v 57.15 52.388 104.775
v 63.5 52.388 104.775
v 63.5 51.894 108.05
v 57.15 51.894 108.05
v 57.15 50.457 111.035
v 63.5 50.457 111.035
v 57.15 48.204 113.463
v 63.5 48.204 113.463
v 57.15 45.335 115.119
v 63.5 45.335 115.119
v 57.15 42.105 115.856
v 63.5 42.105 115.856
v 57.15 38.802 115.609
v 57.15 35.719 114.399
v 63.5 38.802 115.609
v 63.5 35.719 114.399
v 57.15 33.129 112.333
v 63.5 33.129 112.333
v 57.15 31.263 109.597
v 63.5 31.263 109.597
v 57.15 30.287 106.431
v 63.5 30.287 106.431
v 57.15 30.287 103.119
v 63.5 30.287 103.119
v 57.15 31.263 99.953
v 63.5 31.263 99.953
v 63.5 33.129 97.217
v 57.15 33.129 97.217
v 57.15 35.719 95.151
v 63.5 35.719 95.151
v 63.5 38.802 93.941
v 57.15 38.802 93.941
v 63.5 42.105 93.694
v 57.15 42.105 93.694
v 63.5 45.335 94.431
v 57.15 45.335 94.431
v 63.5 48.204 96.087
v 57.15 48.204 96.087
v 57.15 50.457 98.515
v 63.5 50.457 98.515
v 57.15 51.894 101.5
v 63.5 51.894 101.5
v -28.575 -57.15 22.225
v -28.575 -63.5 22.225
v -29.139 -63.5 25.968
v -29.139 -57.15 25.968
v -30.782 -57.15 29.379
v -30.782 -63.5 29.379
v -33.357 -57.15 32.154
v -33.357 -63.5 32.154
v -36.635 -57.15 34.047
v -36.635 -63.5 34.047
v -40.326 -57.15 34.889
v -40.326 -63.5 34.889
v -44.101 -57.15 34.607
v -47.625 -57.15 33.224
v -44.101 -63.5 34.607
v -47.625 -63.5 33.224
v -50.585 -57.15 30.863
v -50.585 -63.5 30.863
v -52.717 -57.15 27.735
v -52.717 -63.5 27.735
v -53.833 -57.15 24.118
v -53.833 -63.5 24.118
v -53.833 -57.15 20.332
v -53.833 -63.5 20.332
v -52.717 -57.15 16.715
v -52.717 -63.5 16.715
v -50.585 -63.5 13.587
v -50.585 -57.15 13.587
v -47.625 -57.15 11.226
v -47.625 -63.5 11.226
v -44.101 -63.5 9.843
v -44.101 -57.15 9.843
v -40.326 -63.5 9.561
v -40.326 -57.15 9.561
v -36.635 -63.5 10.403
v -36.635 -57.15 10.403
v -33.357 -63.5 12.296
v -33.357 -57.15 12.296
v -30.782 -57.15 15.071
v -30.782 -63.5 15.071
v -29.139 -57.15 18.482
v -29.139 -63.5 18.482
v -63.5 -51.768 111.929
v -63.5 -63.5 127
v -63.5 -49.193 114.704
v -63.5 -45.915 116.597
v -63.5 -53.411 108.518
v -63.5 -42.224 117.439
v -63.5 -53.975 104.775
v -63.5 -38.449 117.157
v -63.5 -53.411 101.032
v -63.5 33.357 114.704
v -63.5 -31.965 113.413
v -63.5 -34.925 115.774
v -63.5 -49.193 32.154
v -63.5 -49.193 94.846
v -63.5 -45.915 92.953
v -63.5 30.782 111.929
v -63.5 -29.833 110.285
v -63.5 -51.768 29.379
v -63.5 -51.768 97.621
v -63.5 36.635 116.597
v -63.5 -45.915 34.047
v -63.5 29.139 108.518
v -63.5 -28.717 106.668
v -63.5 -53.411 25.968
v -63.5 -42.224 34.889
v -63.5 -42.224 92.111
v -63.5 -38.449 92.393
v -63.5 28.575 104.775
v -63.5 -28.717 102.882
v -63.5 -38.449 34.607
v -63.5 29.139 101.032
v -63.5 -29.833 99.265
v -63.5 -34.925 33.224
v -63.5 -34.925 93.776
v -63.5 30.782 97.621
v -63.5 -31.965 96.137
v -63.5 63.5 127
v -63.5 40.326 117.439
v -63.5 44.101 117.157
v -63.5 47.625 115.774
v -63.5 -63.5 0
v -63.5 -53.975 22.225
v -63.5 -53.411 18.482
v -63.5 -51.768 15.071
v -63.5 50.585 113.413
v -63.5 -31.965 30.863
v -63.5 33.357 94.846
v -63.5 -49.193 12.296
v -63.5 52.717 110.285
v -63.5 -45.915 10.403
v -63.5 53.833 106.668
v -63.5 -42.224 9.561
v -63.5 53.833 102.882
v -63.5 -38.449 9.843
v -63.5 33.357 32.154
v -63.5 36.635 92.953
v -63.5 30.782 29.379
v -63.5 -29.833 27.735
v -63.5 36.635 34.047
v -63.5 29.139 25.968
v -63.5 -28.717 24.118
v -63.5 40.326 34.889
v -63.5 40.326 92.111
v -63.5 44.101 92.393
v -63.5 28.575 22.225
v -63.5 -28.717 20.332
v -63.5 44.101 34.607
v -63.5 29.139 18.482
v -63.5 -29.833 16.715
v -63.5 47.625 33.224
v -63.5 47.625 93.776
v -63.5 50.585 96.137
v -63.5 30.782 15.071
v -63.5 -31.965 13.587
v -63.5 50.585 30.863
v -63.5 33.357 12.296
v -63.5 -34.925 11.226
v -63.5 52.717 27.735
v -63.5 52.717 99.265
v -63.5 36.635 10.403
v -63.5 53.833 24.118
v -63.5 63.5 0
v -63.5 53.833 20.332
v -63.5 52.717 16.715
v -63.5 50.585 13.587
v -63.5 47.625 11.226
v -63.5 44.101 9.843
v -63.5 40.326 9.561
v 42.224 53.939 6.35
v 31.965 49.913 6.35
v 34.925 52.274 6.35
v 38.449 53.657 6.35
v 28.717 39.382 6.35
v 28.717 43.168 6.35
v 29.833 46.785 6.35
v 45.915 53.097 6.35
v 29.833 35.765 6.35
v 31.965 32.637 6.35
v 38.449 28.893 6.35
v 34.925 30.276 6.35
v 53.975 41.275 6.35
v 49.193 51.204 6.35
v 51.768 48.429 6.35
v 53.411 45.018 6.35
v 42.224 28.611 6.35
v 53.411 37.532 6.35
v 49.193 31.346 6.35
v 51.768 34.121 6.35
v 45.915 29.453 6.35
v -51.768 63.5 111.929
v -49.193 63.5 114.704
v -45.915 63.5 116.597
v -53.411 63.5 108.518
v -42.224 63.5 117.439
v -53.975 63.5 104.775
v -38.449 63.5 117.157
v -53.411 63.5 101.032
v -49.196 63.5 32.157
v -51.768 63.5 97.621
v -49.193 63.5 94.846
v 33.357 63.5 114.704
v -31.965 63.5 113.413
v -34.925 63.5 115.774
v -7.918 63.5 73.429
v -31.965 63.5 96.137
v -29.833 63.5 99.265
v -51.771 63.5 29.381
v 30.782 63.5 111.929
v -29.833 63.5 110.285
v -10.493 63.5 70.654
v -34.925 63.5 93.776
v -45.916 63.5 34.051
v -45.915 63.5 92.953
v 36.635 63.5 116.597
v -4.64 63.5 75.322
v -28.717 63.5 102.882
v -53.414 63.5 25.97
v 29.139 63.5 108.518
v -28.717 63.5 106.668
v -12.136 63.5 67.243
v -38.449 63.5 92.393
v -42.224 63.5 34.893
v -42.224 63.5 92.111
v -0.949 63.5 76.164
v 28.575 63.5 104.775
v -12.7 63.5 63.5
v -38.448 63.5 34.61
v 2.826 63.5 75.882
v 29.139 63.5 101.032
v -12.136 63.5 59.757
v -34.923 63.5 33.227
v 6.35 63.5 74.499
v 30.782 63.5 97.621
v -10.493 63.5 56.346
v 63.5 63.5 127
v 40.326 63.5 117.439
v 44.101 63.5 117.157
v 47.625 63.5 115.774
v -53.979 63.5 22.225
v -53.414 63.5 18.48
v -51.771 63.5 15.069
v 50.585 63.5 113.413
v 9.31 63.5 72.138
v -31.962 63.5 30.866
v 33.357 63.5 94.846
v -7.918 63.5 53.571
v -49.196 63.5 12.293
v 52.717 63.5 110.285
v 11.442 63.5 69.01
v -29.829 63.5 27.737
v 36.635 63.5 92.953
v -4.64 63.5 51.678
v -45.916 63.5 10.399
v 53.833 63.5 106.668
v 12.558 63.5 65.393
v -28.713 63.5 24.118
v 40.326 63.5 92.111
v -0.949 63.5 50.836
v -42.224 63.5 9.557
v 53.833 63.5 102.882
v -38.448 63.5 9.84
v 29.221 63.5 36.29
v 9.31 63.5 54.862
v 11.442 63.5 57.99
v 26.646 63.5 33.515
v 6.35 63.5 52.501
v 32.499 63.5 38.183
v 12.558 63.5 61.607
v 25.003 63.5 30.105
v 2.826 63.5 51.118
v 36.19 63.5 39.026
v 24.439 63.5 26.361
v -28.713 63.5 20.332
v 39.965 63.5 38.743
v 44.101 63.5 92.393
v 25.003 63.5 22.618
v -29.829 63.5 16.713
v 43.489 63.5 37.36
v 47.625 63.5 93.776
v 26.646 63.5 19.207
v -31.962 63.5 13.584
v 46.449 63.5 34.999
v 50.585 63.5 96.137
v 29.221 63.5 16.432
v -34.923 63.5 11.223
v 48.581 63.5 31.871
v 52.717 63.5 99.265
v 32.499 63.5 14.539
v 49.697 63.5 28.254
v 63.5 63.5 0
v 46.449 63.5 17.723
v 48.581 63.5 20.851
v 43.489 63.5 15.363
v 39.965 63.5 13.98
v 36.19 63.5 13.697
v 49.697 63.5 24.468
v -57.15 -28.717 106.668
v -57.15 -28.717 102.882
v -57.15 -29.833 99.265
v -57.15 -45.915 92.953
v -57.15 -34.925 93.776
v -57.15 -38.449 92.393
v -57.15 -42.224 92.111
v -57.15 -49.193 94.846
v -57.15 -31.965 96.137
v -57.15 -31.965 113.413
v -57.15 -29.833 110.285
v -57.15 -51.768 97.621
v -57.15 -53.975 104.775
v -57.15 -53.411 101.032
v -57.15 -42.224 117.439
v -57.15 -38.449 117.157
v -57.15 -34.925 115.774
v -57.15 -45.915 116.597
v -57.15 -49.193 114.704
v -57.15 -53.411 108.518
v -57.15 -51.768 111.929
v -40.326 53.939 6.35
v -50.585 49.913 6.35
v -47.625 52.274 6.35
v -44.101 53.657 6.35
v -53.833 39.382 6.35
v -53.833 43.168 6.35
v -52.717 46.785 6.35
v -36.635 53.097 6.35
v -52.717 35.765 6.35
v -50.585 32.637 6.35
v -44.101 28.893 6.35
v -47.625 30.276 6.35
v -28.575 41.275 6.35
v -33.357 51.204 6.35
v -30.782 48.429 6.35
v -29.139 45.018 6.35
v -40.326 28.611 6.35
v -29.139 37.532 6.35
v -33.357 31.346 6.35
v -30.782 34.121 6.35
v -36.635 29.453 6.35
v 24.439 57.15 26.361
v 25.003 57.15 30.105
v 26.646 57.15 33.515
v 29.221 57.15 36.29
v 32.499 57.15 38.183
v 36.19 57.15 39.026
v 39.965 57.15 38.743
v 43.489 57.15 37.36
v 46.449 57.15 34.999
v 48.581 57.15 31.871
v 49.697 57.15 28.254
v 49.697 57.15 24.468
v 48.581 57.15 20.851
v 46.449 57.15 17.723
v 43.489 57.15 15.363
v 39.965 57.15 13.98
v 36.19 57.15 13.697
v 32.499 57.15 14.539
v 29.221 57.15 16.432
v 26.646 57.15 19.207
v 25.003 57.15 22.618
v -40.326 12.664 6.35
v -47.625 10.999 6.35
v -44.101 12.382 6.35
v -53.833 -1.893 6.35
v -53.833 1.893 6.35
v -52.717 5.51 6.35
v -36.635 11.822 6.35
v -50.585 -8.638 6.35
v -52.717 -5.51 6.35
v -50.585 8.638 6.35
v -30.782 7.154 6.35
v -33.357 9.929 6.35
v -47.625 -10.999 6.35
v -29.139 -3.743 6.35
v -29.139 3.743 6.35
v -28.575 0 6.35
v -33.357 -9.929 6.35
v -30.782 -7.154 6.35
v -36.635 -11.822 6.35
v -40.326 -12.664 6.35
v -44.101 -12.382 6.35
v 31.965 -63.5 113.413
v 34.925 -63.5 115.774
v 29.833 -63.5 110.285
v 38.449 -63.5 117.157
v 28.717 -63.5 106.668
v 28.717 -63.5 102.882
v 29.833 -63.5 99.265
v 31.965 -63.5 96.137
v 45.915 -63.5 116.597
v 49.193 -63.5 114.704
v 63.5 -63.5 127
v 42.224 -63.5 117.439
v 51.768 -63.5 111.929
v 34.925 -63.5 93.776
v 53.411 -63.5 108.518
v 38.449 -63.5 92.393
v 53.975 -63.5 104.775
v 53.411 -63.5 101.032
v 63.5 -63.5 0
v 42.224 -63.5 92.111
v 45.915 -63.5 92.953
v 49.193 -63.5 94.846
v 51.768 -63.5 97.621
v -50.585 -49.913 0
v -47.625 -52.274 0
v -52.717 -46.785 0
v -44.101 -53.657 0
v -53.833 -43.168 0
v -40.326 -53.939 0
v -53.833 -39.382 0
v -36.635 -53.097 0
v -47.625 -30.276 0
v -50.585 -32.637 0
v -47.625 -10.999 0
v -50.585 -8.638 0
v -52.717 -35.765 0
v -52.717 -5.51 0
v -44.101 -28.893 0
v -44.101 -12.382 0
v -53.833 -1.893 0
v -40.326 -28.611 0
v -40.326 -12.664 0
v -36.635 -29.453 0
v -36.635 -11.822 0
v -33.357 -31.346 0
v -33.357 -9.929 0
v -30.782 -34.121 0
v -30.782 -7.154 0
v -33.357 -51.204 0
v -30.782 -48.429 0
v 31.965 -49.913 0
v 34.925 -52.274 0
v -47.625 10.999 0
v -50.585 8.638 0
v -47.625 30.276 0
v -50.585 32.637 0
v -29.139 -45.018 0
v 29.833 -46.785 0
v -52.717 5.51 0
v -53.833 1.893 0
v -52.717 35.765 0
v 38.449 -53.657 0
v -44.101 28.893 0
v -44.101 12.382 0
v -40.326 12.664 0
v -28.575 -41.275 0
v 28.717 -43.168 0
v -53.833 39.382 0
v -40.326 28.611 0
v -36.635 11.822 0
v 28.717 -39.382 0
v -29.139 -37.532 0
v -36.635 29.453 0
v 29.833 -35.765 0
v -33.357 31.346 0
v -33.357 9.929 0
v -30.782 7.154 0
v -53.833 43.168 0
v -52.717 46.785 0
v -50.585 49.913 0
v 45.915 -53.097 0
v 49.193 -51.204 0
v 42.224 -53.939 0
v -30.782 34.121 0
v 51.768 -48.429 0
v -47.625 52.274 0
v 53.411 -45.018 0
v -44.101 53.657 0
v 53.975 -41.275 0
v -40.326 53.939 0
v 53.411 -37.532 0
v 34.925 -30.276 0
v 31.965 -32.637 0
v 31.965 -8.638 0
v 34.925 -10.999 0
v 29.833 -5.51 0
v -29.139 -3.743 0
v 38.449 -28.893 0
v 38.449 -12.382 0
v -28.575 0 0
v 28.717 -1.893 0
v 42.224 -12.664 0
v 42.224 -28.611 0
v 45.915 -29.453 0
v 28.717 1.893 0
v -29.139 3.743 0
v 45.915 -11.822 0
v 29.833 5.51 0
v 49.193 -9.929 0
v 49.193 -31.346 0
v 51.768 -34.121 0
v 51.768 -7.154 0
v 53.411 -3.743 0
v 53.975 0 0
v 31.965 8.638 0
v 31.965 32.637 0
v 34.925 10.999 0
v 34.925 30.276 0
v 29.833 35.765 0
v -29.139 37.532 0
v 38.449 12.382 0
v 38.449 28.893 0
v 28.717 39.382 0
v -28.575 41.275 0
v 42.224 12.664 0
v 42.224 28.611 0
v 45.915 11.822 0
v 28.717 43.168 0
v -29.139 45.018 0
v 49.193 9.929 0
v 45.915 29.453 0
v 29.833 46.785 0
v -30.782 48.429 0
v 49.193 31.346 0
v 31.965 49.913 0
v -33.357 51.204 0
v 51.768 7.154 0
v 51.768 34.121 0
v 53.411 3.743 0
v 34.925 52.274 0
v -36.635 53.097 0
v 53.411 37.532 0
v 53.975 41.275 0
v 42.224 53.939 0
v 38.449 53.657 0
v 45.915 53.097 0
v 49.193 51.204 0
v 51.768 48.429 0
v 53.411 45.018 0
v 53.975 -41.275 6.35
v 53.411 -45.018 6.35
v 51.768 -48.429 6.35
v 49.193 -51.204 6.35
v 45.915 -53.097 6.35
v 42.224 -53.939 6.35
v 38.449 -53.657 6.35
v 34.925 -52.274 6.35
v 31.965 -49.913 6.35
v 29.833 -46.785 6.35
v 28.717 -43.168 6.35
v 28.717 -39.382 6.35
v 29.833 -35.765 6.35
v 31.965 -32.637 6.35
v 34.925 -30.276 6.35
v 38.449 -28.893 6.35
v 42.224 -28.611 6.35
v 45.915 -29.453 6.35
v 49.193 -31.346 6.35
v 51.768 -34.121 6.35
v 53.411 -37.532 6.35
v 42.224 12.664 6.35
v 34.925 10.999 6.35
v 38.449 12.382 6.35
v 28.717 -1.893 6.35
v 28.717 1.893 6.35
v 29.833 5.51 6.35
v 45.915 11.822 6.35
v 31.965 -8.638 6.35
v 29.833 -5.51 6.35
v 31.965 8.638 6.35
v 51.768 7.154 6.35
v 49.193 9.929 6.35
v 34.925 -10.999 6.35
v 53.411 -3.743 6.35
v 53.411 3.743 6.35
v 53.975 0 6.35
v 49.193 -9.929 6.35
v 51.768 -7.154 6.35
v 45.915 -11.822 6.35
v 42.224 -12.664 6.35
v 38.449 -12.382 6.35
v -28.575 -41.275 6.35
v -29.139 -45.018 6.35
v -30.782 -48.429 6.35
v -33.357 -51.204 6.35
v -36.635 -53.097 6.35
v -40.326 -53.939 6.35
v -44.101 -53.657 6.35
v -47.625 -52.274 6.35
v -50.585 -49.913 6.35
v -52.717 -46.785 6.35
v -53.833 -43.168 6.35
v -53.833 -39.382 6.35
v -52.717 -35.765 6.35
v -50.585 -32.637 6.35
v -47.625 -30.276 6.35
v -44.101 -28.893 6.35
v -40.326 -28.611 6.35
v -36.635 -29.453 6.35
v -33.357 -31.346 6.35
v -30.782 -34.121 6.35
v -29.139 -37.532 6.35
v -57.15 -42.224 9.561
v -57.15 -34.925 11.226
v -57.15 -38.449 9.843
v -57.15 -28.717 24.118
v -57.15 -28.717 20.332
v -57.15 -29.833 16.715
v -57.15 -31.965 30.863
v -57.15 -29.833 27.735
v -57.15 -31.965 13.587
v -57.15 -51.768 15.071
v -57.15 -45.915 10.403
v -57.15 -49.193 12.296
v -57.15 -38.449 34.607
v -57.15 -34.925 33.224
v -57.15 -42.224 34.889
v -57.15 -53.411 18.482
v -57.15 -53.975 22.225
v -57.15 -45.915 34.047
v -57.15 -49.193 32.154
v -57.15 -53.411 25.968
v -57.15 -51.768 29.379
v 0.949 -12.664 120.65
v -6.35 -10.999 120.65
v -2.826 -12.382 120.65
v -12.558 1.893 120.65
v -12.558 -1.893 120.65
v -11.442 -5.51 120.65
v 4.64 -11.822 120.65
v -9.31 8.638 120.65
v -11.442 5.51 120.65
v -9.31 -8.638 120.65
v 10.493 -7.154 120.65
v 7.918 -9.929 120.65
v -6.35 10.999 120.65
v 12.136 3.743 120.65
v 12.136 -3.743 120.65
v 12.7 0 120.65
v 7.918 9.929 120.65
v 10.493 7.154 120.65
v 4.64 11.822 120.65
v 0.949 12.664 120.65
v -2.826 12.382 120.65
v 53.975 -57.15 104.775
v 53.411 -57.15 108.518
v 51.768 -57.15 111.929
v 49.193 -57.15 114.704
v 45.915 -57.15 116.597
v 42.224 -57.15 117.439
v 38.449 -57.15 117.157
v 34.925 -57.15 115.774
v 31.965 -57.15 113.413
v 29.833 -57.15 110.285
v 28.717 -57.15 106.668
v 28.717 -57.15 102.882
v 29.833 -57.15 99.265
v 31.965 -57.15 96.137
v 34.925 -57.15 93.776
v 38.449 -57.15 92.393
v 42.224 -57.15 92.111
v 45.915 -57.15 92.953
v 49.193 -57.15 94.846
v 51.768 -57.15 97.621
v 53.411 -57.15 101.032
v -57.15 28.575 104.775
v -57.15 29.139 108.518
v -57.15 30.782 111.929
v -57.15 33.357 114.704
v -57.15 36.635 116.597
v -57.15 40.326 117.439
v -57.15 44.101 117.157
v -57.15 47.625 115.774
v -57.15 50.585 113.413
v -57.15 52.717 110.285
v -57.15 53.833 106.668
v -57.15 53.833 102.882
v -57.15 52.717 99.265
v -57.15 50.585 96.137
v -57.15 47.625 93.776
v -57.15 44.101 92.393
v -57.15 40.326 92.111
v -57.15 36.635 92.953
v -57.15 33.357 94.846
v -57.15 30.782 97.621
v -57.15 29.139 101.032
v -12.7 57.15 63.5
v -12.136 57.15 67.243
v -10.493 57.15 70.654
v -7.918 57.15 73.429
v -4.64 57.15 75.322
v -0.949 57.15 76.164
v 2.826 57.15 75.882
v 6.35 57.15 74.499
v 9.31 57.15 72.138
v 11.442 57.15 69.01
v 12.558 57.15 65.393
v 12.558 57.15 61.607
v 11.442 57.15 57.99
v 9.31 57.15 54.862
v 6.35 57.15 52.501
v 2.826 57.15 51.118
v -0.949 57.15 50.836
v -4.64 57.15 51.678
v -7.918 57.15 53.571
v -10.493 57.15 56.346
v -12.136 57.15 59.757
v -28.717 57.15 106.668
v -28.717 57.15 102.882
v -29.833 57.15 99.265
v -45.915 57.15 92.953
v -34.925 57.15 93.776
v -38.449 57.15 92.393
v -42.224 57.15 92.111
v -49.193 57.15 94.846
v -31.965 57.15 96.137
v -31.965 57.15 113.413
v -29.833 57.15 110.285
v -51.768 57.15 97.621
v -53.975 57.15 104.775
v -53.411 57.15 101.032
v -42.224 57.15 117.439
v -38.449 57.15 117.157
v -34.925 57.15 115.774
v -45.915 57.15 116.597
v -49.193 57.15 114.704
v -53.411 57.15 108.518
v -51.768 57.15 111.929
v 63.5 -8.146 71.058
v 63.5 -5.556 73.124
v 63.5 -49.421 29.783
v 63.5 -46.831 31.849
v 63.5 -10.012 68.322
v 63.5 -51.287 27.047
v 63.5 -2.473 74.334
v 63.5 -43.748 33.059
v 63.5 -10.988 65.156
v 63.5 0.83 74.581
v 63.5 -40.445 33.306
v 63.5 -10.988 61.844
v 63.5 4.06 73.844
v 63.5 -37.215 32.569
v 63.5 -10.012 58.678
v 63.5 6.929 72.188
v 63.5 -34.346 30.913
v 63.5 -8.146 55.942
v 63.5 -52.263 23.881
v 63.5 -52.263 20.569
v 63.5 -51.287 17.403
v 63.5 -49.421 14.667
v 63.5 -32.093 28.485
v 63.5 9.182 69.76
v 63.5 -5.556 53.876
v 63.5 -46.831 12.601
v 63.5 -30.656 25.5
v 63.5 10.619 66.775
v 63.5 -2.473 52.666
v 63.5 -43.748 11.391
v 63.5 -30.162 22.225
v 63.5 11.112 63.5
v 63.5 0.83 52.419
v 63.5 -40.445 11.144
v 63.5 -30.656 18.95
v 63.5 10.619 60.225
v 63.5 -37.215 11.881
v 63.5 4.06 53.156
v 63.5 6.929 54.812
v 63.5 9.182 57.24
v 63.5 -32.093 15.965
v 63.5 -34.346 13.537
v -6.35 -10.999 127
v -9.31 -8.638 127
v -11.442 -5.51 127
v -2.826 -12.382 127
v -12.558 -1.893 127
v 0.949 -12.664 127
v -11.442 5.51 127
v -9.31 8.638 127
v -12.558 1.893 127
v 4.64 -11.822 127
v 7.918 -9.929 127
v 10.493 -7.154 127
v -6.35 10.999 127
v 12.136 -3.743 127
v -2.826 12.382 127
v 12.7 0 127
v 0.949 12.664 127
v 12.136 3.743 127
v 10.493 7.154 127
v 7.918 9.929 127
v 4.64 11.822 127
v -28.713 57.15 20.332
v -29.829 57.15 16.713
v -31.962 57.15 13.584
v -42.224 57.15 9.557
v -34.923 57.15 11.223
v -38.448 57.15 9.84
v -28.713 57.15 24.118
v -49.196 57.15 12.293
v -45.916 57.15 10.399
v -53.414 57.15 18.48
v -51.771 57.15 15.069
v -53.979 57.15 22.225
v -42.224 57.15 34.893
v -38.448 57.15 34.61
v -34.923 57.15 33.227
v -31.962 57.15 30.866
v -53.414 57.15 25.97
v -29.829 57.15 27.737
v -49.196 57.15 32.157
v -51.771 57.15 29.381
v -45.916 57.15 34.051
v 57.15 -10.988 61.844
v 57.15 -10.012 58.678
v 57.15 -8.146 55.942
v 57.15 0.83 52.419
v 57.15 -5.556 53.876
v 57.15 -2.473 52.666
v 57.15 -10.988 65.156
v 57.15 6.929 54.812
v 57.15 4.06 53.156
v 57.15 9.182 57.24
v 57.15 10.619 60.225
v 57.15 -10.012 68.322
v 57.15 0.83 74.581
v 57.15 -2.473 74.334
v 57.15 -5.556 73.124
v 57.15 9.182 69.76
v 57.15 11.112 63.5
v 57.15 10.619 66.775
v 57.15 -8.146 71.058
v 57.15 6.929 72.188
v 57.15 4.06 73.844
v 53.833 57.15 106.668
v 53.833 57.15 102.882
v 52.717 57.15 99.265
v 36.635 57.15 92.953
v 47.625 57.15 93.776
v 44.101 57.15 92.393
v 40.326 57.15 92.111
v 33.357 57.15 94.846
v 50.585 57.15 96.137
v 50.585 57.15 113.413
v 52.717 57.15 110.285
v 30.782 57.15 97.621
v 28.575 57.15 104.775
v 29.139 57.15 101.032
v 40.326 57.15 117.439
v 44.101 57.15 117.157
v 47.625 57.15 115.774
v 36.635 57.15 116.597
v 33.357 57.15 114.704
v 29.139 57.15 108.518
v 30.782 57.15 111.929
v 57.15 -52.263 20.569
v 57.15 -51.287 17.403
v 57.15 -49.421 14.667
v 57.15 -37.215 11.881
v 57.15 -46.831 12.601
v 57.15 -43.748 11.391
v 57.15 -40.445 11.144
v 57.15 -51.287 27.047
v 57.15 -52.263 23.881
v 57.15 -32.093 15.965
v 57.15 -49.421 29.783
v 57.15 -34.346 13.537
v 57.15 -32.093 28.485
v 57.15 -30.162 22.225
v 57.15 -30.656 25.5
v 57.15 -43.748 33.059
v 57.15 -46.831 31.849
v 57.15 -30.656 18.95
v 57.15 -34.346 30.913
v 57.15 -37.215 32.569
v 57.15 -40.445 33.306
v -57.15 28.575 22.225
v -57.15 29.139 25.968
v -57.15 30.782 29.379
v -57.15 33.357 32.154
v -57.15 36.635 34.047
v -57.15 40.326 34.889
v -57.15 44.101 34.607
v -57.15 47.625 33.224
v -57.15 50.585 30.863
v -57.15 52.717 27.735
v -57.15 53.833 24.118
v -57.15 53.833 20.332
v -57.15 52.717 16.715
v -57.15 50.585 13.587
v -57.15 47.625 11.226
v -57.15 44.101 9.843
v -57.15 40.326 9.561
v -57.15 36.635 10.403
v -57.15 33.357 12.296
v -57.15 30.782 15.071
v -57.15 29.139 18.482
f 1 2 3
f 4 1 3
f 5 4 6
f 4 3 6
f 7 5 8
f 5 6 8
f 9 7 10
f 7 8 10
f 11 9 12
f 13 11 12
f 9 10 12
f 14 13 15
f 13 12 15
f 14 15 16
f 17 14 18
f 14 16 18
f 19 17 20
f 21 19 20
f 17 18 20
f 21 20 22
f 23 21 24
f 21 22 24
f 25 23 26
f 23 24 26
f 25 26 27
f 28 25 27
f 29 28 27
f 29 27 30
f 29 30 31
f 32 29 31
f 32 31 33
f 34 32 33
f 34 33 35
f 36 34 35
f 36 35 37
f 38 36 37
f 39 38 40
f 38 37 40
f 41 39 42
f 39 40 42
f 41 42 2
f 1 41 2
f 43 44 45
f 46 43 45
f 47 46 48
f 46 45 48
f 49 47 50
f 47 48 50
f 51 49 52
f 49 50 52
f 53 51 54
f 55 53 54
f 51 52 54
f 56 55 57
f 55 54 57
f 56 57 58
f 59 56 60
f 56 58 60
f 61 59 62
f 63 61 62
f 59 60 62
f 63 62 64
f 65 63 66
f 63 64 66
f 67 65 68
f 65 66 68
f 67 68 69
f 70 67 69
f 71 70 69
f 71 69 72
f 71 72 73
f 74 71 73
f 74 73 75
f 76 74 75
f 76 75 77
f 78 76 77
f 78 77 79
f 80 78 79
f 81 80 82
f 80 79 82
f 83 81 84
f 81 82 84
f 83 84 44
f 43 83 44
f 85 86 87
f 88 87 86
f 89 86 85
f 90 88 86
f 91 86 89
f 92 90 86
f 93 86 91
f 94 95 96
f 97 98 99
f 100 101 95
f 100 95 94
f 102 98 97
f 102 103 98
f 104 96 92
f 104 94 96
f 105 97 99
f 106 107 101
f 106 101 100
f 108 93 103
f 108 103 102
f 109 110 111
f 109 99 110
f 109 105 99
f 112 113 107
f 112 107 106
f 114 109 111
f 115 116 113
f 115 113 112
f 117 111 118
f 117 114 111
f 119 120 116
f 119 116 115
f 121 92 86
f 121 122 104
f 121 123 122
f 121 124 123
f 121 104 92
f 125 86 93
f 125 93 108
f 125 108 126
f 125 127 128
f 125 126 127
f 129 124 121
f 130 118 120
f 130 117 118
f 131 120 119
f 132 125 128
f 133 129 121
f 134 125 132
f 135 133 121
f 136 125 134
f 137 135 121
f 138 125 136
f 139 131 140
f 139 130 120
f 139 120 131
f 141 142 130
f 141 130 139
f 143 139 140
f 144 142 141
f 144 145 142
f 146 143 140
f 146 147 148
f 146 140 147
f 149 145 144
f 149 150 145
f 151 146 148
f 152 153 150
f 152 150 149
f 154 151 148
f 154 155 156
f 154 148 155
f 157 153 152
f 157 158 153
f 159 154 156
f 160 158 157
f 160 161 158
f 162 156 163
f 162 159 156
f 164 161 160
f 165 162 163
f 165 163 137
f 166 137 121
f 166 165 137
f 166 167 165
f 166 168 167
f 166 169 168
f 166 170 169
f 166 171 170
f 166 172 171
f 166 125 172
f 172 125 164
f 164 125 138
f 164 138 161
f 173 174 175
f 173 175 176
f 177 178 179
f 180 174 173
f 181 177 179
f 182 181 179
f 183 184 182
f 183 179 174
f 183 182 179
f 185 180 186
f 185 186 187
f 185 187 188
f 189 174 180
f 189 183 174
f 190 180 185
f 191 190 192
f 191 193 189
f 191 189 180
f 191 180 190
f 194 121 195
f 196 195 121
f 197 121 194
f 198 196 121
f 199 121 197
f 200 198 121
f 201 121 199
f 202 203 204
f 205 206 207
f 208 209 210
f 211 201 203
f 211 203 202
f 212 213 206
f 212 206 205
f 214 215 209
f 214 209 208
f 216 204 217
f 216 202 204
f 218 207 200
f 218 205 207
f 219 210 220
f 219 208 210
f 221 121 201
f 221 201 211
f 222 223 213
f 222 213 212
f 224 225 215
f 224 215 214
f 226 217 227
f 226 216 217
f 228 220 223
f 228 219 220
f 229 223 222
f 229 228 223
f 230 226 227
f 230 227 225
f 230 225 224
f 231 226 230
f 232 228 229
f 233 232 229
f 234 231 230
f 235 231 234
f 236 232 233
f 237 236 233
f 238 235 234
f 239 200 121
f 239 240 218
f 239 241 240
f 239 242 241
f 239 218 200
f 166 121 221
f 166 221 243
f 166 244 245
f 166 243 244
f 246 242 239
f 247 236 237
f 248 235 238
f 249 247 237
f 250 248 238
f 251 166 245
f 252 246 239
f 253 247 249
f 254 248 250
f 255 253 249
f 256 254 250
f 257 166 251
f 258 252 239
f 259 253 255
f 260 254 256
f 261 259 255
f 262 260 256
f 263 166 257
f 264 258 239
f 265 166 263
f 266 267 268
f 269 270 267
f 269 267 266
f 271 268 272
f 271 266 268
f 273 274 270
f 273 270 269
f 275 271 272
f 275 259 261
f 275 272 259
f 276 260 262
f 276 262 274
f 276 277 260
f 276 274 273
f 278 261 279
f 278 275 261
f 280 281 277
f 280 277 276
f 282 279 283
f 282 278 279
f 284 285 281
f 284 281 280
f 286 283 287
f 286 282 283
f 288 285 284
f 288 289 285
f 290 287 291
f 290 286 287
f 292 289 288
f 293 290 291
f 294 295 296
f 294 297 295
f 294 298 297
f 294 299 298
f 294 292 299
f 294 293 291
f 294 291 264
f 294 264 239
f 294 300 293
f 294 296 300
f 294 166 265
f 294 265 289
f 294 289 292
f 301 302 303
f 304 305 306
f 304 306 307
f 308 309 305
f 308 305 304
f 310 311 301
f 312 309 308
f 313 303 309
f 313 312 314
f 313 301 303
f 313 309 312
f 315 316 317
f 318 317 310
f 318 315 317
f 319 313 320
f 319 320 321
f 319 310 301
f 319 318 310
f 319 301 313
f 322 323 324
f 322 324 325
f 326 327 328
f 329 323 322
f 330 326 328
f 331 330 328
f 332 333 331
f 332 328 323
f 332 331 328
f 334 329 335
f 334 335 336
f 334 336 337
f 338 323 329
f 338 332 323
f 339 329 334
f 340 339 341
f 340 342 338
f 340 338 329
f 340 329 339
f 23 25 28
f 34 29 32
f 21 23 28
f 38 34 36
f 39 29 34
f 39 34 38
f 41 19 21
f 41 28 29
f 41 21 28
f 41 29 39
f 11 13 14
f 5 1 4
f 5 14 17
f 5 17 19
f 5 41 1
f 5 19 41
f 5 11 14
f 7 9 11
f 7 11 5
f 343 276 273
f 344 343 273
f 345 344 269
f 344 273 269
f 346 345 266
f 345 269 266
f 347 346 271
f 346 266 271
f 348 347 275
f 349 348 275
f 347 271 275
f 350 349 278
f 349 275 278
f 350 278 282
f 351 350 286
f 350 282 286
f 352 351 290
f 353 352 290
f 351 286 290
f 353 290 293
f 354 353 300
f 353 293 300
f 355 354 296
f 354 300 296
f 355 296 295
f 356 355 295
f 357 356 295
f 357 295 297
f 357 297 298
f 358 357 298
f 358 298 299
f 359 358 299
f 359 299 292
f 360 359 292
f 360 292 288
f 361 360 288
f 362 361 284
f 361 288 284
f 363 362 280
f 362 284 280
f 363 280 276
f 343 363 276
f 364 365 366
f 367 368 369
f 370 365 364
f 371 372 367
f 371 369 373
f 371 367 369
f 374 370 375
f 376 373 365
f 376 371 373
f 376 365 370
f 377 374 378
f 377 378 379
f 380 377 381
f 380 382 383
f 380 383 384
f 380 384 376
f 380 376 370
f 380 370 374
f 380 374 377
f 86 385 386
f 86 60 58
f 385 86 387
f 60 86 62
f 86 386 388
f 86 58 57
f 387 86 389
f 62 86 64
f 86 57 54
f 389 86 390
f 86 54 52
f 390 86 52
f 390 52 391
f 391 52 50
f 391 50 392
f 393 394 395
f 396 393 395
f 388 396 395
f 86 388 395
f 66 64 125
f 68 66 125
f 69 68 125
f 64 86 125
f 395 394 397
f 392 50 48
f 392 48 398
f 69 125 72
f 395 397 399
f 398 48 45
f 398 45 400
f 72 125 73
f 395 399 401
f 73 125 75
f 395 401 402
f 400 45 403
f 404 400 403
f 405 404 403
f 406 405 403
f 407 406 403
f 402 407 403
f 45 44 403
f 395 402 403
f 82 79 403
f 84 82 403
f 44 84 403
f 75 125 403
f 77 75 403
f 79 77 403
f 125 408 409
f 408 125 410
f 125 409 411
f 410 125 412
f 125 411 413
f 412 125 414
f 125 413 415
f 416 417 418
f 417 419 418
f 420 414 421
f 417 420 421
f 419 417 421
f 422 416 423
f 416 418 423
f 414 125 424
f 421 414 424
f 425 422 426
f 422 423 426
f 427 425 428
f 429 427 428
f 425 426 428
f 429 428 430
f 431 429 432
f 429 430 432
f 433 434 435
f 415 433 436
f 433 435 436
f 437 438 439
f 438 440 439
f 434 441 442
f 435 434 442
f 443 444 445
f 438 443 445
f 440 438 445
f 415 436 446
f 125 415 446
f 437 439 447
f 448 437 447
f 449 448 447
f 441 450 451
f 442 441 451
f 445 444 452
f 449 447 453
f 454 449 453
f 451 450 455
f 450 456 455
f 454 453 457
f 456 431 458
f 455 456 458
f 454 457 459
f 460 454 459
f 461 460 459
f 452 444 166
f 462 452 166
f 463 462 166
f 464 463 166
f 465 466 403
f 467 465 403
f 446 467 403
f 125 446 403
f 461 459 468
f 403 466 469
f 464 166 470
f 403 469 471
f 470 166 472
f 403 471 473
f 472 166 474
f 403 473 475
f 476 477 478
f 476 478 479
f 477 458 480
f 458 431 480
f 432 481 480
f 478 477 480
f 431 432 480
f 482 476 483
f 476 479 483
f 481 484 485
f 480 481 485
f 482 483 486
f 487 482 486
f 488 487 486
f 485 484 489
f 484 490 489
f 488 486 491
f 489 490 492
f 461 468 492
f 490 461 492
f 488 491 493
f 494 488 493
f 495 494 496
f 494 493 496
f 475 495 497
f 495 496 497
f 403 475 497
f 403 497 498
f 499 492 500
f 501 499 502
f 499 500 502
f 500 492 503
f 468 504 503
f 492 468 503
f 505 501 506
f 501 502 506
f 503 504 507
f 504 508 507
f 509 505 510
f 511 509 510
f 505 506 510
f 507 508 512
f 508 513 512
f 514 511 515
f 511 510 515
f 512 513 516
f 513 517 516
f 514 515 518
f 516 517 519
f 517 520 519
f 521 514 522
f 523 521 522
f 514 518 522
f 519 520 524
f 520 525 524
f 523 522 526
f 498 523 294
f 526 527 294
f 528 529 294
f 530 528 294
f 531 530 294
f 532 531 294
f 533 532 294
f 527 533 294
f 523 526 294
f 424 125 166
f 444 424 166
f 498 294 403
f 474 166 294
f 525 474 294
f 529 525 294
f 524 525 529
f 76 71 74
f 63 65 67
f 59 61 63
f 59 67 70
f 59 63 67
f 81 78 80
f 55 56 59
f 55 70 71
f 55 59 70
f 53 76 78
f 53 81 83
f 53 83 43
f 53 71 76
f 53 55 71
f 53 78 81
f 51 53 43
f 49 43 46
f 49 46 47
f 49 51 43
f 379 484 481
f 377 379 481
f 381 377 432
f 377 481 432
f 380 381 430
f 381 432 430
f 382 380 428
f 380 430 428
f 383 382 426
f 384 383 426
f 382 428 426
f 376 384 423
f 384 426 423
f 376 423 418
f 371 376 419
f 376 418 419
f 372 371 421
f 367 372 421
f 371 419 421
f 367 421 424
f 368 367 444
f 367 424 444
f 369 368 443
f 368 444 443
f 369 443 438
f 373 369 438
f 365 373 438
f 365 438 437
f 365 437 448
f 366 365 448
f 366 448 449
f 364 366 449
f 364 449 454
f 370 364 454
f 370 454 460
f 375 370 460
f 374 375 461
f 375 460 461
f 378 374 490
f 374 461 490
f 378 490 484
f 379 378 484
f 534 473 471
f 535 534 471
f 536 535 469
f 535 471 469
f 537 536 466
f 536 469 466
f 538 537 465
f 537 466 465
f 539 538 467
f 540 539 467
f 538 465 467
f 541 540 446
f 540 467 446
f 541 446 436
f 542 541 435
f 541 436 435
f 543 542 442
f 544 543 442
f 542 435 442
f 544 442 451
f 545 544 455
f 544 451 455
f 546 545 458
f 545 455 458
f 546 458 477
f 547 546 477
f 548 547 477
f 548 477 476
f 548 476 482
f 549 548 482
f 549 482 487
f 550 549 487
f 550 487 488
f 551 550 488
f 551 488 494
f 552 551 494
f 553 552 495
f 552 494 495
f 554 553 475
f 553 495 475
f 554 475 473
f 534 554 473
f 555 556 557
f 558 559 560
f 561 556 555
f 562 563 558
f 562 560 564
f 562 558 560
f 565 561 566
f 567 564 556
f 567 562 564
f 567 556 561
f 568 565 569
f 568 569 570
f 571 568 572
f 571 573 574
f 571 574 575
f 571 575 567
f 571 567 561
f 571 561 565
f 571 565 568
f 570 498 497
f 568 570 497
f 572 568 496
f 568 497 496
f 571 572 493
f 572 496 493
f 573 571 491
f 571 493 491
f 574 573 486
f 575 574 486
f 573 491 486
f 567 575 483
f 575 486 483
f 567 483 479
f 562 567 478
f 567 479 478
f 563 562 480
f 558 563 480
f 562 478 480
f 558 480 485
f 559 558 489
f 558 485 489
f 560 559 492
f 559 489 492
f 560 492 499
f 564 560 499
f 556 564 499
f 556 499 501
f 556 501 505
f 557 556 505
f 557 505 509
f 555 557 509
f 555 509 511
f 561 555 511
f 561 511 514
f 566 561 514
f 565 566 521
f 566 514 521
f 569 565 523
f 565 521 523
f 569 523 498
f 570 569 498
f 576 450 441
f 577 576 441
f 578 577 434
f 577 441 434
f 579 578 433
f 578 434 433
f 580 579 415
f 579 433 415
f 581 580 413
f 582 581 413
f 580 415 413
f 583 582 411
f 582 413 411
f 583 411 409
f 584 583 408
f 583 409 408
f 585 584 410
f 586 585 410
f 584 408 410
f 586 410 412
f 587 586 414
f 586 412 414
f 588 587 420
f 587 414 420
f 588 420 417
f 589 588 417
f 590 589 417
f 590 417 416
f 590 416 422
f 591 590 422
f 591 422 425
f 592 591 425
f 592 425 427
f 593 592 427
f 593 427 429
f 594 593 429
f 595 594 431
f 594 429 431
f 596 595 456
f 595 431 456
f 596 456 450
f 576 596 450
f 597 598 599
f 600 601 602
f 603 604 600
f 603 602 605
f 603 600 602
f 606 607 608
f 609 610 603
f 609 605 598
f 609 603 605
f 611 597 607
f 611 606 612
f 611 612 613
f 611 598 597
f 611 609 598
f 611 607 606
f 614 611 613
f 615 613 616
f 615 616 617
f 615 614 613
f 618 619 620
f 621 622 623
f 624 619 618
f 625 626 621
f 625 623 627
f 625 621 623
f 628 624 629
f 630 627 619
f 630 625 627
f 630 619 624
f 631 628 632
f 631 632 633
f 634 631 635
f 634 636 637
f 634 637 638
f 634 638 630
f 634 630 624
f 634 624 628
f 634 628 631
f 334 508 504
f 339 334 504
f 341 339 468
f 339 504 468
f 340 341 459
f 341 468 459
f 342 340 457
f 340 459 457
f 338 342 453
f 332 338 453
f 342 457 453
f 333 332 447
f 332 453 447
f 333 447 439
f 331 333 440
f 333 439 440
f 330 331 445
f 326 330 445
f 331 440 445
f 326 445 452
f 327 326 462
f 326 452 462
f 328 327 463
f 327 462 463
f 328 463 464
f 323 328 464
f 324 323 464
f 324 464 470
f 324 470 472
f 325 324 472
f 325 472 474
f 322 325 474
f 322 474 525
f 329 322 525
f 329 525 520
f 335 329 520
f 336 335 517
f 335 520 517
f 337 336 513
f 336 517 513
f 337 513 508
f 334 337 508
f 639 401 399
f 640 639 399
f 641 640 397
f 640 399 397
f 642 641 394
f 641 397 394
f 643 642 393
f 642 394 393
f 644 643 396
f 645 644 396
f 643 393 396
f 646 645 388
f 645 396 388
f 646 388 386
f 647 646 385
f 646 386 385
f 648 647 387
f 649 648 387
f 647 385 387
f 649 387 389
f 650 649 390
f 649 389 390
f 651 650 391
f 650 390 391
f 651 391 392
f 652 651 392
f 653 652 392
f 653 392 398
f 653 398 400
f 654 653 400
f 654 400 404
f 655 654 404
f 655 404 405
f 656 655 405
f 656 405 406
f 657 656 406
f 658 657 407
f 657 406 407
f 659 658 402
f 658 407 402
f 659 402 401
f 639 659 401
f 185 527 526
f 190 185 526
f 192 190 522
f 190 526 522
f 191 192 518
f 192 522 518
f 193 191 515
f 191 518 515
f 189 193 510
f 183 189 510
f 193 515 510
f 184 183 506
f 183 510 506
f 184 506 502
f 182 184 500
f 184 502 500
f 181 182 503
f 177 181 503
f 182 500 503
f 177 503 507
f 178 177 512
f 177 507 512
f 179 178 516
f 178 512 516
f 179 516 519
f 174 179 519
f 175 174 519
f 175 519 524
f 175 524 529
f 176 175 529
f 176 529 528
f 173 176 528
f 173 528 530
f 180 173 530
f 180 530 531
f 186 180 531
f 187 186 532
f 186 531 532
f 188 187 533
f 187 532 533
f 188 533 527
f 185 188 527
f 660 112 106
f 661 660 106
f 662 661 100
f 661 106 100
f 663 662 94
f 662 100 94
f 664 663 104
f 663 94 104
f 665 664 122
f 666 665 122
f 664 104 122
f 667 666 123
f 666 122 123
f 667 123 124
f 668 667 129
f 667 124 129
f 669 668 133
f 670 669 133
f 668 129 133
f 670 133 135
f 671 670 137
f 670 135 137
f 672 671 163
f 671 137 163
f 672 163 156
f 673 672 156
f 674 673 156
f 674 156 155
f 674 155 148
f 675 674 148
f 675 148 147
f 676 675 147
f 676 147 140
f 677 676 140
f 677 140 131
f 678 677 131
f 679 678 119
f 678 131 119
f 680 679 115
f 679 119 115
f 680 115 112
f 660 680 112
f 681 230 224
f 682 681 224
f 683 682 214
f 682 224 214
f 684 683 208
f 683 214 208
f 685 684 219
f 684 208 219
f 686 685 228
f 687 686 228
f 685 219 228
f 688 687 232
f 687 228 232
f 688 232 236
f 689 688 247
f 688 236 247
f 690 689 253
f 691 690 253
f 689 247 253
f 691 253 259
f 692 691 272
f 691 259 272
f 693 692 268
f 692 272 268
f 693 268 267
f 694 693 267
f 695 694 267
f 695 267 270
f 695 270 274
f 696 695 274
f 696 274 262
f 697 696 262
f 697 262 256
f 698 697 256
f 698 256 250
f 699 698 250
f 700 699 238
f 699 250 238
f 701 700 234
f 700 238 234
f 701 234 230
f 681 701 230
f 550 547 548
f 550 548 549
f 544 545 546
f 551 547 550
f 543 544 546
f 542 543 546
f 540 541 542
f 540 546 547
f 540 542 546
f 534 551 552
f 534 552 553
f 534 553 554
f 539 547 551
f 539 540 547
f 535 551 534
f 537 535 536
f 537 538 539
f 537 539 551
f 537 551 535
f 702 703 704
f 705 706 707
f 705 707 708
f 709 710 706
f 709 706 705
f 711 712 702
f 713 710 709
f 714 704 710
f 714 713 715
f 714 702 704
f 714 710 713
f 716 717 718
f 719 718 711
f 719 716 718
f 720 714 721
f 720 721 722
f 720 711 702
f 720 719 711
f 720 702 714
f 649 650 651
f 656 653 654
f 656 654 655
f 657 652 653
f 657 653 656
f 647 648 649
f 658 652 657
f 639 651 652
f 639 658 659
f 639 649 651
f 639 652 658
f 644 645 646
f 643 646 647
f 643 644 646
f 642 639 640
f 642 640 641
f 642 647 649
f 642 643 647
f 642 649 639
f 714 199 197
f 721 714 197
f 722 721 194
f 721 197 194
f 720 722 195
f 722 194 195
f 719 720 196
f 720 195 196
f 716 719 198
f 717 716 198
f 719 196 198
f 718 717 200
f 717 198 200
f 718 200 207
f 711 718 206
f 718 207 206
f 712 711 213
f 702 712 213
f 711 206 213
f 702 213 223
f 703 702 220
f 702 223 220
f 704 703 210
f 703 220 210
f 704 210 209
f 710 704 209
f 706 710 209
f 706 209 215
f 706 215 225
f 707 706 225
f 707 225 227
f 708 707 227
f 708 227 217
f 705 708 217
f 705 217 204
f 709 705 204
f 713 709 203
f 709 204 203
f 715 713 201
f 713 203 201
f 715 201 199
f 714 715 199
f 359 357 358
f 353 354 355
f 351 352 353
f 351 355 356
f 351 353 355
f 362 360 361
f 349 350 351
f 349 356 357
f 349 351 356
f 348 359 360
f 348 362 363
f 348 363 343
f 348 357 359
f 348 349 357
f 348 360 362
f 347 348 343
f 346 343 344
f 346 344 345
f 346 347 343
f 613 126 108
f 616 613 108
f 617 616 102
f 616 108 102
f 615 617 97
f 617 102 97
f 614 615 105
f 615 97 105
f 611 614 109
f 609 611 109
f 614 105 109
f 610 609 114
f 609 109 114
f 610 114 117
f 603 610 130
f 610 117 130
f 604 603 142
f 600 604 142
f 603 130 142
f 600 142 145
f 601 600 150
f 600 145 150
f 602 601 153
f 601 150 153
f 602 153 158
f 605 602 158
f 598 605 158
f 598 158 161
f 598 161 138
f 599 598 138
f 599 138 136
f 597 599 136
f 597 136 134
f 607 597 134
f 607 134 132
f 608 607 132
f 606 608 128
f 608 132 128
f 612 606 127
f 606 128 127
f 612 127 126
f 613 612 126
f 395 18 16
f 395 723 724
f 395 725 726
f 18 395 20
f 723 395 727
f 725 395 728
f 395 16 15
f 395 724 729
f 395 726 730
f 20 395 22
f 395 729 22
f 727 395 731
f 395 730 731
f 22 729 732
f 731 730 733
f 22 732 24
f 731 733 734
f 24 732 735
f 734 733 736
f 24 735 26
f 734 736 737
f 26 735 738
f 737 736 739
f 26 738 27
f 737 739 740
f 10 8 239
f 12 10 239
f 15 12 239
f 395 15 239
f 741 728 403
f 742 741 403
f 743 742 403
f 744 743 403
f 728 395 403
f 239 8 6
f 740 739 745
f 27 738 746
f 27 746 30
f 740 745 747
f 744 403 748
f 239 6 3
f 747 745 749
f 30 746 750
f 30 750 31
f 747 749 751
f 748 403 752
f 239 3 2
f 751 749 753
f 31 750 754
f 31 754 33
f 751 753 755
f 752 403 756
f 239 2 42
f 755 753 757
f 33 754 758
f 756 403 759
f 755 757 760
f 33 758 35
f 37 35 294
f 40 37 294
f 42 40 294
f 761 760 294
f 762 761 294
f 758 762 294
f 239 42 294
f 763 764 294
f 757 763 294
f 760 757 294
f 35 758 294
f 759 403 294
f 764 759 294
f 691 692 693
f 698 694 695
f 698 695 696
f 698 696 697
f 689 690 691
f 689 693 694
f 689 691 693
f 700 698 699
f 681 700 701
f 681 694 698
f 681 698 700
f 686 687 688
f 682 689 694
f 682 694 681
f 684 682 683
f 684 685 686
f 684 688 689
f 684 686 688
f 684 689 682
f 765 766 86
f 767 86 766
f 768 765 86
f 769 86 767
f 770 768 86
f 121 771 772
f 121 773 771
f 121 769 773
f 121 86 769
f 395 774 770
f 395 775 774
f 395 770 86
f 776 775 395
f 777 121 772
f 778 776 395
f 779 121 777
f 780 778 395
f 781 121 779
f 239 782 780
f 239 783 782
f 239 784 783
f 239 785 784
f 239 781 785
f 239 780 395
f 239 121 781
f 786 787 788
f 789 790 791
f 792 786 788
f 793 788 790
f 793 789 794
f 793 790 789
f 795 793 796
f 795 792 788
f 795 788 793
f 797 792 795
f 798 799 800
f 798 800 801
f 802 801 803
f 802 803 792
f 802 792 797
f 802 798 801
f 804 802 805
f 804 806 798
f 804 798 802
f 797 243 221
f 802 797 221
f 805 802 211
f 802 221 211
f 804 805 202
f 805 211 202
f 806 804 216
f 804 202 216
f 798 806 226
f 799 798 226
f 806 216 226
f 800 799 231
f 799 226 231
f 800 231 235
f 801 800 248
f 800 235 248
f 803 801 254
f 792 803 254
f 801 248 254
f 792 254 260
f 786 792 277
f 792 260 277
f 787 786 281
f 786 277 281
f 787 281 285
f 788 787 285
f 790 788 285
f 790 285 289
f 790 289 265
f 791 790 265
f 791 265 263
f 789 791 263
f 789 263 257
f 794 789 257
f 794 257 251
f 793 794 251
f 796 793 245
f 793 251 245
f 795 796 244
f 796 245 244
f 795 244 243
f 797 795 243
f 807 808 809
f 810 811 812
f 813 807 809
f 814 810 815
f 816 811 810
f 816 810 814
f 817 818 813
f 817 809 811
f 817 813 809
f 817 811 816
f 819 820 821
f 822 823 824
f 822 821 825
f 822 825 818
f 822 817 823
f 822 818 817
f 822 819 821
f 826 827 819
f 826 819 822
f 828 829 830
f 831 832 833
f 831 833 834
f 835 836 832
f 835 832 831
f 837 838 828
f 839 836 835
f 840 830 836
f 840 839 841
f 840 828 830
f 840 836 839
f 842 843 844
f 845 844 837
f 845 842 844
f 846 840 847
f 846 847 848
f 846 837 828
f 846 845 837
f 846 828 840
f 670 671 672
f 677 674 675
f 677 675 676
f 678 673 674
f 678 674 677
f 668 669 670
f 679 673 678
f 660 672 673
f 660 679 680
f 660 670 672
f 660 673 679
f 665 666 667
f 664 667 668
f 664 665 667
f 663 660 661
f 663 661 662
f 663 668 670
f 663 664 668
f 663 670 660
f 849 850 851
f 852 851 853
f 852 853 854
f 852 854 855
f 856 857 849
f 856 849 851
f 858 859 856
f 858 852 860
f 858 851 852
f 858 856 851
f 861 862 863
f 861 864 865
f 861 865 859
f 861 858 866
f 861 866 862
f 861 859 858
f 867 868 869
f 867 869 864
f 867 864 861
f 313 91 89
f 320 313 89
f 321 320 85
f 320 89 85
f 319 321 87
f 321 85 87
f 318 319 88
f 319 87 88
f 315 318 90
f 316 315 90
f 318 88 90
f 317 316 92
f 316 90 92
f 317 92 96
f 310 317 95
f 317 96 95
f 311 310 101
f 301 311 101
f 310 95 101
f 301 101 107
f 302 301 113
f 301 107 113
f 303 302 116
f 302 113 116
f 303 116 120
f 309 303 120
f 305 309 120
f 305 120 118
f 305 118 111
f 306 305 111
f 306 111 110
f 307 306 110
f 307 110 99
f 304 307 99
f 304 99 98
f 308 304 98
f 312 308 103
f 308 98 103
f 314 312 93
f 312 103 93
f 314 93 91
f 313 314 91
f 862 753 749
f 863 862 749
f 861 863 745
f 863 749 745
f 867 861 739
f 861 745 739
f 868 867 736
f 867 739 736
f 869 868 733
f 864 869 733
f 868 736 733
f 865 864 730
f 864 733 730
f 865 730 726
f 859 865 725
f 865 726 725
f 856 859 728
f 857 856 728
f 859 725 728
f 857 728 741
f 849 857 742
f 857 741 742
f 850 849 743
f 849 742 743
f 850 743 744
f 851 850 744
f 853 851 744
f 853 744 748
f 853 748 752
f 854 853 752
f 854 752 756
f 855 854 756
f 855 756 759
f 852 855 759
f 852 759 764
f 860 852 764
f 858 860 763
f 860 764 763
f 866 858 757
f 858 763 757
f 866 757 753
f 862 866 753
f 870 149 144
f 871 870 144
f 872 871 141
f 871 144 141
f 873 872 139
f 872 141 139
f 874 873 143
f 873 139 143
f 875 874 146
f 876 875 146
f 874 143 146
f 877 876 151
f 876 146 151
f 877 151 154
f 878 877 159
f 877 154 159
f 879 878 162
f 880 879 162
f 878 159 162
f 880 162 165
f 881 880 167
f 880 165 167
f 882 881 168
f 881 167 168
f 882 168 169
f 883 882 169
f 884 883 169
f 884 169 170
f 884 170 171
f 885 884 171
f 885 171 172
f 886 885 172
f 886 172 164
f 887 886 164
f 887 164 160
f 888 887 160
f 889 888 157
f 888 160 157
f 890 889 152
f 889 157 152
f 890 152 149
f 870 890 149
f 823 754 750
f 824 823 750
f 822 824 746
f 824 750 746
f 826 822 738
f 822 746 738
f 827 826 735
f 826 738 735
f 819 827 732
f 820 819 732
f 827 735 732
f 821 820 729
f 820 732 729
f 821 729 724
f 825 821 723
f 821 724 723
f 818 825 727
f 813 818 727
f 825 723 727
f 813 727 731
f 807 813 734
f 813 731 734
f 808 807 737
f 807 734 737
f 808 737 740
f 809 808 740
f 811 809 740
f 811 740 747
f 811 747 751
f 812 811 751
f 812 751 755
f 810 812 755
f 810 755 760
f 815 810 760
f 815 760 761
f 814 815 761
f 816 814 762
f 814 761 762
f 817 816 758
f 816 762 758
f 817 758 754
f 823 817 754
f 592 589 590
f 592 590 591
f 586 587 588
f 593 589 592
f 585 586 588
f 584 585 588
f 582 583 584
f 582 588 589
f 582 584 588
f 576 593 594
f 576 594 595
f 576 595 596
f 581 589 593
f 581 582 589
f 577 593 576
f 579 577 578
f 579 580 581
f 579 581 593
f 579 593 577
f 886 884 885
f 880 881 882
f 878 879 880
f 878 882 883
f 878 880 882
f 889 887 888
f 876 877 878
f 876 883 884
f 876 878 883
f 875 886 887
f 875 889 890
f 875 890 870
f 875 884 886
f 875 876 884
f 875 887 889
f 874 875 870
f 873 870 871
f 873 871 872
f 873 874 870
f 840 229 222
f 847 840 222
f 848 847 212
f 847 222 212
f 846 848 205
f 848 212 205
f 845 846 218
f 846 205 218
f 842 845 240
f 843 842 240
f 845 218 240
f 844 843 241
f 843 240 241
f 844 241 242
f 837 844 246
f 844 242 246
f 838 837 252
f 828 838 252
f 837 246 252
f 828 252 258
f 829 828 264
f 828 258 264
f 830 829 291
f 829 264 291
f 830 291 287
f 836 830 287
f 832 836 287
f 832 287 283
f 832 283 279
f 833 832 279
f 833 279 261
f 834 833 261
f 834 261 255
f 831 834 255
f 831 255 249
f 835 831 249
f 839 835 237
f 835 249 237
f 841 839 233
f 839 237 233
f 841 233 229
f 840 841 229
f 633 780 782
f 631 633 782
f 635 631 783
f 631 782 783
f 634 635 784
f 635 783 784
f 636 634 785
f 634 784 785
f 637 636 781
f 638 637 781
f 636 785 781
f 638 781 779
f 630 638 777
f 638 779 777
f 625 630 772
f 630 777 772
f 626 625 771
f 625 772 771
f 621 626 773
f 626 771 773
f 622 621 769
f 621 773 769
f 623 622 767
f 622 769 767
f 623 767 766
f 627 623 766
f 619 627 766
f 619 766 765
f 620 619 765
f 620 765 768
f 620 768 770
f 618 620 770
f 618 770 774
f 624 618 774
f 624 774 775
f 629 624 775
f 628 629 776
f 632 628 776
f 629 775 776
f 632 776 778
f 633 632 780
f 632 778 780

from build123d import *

# Parameters (mm, degrees)
F0_W      = 127
F0_H      = 127
F1_DEPTH  = 127
F2_R      = 12.7
F3_DEPTH  = 6.35
F4_R      = 12.7
F5_DEPTH  = 6.35
F6_R      = 11.1125
F7_DEPTH  = 6.35
F8_R      = 12.7
F9_DEPTH  = 6.35
F10_R     = 12.7
F10_R_2   = 12.703885
F11_DEPTH = 6.35
F12_R     = 12.7
F13_DEPTH = 6.35


with BuildPart() as f1:
    # F0 (on Top) → F1 (new body)
    with BuildSketch(Plane.XY):
        Rectangle(F0_W, F0_H)
    extrude(amount=F1_DEPTH)

    # F2 (on face) → F3 (cut)
    with BuildSketch(Plane.XY.offset(127)):
        Circle(F2_R)
    extrude(amount=-F3_DEPTH, mode=Mode.SUBTRACT)

    # F4 (on face) → F5 (cut)
    with BuildSketch(Plane.XZ.offset(63.5)):
        with Locations((-41.275, 22.225)):
            Circle(F4_R)
        with Locations((41.275, 104.775)):
            Circle(F4_R)
    extrude(amount=-F5_DEPTH, mode=Mode.SUBTRACT)

    # F6 (on face) → F7 (cut)
    with BuildSketch(Plane.YZ.offset(63.5)):
        with Locations((-41.275, 22.225)):
            Circle(F6_R)
        with Locations((41.275, 104.775)):
            Circle(F6_R)
        with Locations((0, 63.5)):
            Circle(F6_R)
    extrude(amount=-F7_DEPTH, mode=Mode.SUBTRACT)

    # F8 (on face) → F9 (cut)
    with BuildSketch(Plane(origin=(-63.5, 0, 0), x_dir=(0, -1, 0), z_dir=(-1, 0, 0))):
        with Locations((-41.275, 22.225)):
            Circle(F8_R)
        with Locations((41.275, 22.225)):
            Circle(F8_R)
        with Locations((41.275, 104.775)):
            Circle(F8_R)
        with Locations((-41.275, 104.775)):
            Circle(F8_R)
    extrude(amount=-F9_DEPTH, mode=Mode.SUBTRACT)

    # F10 (on face) → F11 (cut)
    with BuildSketch(Plane(origin=(0, 63.5, 0), x_dir=(-1, 0, 0), z_dir=(0, 1, 0))):
        with Locations((-41.275, 104.775)):
            Circle(F10_R)
        with Locations((41.275, 104.775)):
            Circle(F10_R)
        with Locations((41.275, 22.225)):
            Circle(F10_R_2)
        with Locations((-37.138888, 26.361112)):
            Circle(F10_R)
        with Locations((0, 63.5)):
            Circle(F10_R)
    extrude(amount=-F11_DEPTH, mode=Mode.SUBTRACT)

    # F12 (on face) → F13 (cut)
    with BuildSketch(Plane(origin=(0, 0, 0), x_dir=(1, 0, 0), z_dir=(0, 0, -1))):
        with Locations((-41.275, 41.275)):
            Circle(F12_R)
        with Locations((41.275, 41.275)):
            Circle(F12_R)
        with Locations((-41.275, 0)):
            Circle(F12_R)
        with Locations((-41.275, -41.275)):
            Circle(F12_R)
        with Locations((41.275, 0)):
            Circle(F12_R)
        with Locations((41.275, -41.275)):
            Circle(F12_R)
    extrude(amount=-F13_DEPTH, mode=Mode.SUBTRACT)


solid = f1.part
